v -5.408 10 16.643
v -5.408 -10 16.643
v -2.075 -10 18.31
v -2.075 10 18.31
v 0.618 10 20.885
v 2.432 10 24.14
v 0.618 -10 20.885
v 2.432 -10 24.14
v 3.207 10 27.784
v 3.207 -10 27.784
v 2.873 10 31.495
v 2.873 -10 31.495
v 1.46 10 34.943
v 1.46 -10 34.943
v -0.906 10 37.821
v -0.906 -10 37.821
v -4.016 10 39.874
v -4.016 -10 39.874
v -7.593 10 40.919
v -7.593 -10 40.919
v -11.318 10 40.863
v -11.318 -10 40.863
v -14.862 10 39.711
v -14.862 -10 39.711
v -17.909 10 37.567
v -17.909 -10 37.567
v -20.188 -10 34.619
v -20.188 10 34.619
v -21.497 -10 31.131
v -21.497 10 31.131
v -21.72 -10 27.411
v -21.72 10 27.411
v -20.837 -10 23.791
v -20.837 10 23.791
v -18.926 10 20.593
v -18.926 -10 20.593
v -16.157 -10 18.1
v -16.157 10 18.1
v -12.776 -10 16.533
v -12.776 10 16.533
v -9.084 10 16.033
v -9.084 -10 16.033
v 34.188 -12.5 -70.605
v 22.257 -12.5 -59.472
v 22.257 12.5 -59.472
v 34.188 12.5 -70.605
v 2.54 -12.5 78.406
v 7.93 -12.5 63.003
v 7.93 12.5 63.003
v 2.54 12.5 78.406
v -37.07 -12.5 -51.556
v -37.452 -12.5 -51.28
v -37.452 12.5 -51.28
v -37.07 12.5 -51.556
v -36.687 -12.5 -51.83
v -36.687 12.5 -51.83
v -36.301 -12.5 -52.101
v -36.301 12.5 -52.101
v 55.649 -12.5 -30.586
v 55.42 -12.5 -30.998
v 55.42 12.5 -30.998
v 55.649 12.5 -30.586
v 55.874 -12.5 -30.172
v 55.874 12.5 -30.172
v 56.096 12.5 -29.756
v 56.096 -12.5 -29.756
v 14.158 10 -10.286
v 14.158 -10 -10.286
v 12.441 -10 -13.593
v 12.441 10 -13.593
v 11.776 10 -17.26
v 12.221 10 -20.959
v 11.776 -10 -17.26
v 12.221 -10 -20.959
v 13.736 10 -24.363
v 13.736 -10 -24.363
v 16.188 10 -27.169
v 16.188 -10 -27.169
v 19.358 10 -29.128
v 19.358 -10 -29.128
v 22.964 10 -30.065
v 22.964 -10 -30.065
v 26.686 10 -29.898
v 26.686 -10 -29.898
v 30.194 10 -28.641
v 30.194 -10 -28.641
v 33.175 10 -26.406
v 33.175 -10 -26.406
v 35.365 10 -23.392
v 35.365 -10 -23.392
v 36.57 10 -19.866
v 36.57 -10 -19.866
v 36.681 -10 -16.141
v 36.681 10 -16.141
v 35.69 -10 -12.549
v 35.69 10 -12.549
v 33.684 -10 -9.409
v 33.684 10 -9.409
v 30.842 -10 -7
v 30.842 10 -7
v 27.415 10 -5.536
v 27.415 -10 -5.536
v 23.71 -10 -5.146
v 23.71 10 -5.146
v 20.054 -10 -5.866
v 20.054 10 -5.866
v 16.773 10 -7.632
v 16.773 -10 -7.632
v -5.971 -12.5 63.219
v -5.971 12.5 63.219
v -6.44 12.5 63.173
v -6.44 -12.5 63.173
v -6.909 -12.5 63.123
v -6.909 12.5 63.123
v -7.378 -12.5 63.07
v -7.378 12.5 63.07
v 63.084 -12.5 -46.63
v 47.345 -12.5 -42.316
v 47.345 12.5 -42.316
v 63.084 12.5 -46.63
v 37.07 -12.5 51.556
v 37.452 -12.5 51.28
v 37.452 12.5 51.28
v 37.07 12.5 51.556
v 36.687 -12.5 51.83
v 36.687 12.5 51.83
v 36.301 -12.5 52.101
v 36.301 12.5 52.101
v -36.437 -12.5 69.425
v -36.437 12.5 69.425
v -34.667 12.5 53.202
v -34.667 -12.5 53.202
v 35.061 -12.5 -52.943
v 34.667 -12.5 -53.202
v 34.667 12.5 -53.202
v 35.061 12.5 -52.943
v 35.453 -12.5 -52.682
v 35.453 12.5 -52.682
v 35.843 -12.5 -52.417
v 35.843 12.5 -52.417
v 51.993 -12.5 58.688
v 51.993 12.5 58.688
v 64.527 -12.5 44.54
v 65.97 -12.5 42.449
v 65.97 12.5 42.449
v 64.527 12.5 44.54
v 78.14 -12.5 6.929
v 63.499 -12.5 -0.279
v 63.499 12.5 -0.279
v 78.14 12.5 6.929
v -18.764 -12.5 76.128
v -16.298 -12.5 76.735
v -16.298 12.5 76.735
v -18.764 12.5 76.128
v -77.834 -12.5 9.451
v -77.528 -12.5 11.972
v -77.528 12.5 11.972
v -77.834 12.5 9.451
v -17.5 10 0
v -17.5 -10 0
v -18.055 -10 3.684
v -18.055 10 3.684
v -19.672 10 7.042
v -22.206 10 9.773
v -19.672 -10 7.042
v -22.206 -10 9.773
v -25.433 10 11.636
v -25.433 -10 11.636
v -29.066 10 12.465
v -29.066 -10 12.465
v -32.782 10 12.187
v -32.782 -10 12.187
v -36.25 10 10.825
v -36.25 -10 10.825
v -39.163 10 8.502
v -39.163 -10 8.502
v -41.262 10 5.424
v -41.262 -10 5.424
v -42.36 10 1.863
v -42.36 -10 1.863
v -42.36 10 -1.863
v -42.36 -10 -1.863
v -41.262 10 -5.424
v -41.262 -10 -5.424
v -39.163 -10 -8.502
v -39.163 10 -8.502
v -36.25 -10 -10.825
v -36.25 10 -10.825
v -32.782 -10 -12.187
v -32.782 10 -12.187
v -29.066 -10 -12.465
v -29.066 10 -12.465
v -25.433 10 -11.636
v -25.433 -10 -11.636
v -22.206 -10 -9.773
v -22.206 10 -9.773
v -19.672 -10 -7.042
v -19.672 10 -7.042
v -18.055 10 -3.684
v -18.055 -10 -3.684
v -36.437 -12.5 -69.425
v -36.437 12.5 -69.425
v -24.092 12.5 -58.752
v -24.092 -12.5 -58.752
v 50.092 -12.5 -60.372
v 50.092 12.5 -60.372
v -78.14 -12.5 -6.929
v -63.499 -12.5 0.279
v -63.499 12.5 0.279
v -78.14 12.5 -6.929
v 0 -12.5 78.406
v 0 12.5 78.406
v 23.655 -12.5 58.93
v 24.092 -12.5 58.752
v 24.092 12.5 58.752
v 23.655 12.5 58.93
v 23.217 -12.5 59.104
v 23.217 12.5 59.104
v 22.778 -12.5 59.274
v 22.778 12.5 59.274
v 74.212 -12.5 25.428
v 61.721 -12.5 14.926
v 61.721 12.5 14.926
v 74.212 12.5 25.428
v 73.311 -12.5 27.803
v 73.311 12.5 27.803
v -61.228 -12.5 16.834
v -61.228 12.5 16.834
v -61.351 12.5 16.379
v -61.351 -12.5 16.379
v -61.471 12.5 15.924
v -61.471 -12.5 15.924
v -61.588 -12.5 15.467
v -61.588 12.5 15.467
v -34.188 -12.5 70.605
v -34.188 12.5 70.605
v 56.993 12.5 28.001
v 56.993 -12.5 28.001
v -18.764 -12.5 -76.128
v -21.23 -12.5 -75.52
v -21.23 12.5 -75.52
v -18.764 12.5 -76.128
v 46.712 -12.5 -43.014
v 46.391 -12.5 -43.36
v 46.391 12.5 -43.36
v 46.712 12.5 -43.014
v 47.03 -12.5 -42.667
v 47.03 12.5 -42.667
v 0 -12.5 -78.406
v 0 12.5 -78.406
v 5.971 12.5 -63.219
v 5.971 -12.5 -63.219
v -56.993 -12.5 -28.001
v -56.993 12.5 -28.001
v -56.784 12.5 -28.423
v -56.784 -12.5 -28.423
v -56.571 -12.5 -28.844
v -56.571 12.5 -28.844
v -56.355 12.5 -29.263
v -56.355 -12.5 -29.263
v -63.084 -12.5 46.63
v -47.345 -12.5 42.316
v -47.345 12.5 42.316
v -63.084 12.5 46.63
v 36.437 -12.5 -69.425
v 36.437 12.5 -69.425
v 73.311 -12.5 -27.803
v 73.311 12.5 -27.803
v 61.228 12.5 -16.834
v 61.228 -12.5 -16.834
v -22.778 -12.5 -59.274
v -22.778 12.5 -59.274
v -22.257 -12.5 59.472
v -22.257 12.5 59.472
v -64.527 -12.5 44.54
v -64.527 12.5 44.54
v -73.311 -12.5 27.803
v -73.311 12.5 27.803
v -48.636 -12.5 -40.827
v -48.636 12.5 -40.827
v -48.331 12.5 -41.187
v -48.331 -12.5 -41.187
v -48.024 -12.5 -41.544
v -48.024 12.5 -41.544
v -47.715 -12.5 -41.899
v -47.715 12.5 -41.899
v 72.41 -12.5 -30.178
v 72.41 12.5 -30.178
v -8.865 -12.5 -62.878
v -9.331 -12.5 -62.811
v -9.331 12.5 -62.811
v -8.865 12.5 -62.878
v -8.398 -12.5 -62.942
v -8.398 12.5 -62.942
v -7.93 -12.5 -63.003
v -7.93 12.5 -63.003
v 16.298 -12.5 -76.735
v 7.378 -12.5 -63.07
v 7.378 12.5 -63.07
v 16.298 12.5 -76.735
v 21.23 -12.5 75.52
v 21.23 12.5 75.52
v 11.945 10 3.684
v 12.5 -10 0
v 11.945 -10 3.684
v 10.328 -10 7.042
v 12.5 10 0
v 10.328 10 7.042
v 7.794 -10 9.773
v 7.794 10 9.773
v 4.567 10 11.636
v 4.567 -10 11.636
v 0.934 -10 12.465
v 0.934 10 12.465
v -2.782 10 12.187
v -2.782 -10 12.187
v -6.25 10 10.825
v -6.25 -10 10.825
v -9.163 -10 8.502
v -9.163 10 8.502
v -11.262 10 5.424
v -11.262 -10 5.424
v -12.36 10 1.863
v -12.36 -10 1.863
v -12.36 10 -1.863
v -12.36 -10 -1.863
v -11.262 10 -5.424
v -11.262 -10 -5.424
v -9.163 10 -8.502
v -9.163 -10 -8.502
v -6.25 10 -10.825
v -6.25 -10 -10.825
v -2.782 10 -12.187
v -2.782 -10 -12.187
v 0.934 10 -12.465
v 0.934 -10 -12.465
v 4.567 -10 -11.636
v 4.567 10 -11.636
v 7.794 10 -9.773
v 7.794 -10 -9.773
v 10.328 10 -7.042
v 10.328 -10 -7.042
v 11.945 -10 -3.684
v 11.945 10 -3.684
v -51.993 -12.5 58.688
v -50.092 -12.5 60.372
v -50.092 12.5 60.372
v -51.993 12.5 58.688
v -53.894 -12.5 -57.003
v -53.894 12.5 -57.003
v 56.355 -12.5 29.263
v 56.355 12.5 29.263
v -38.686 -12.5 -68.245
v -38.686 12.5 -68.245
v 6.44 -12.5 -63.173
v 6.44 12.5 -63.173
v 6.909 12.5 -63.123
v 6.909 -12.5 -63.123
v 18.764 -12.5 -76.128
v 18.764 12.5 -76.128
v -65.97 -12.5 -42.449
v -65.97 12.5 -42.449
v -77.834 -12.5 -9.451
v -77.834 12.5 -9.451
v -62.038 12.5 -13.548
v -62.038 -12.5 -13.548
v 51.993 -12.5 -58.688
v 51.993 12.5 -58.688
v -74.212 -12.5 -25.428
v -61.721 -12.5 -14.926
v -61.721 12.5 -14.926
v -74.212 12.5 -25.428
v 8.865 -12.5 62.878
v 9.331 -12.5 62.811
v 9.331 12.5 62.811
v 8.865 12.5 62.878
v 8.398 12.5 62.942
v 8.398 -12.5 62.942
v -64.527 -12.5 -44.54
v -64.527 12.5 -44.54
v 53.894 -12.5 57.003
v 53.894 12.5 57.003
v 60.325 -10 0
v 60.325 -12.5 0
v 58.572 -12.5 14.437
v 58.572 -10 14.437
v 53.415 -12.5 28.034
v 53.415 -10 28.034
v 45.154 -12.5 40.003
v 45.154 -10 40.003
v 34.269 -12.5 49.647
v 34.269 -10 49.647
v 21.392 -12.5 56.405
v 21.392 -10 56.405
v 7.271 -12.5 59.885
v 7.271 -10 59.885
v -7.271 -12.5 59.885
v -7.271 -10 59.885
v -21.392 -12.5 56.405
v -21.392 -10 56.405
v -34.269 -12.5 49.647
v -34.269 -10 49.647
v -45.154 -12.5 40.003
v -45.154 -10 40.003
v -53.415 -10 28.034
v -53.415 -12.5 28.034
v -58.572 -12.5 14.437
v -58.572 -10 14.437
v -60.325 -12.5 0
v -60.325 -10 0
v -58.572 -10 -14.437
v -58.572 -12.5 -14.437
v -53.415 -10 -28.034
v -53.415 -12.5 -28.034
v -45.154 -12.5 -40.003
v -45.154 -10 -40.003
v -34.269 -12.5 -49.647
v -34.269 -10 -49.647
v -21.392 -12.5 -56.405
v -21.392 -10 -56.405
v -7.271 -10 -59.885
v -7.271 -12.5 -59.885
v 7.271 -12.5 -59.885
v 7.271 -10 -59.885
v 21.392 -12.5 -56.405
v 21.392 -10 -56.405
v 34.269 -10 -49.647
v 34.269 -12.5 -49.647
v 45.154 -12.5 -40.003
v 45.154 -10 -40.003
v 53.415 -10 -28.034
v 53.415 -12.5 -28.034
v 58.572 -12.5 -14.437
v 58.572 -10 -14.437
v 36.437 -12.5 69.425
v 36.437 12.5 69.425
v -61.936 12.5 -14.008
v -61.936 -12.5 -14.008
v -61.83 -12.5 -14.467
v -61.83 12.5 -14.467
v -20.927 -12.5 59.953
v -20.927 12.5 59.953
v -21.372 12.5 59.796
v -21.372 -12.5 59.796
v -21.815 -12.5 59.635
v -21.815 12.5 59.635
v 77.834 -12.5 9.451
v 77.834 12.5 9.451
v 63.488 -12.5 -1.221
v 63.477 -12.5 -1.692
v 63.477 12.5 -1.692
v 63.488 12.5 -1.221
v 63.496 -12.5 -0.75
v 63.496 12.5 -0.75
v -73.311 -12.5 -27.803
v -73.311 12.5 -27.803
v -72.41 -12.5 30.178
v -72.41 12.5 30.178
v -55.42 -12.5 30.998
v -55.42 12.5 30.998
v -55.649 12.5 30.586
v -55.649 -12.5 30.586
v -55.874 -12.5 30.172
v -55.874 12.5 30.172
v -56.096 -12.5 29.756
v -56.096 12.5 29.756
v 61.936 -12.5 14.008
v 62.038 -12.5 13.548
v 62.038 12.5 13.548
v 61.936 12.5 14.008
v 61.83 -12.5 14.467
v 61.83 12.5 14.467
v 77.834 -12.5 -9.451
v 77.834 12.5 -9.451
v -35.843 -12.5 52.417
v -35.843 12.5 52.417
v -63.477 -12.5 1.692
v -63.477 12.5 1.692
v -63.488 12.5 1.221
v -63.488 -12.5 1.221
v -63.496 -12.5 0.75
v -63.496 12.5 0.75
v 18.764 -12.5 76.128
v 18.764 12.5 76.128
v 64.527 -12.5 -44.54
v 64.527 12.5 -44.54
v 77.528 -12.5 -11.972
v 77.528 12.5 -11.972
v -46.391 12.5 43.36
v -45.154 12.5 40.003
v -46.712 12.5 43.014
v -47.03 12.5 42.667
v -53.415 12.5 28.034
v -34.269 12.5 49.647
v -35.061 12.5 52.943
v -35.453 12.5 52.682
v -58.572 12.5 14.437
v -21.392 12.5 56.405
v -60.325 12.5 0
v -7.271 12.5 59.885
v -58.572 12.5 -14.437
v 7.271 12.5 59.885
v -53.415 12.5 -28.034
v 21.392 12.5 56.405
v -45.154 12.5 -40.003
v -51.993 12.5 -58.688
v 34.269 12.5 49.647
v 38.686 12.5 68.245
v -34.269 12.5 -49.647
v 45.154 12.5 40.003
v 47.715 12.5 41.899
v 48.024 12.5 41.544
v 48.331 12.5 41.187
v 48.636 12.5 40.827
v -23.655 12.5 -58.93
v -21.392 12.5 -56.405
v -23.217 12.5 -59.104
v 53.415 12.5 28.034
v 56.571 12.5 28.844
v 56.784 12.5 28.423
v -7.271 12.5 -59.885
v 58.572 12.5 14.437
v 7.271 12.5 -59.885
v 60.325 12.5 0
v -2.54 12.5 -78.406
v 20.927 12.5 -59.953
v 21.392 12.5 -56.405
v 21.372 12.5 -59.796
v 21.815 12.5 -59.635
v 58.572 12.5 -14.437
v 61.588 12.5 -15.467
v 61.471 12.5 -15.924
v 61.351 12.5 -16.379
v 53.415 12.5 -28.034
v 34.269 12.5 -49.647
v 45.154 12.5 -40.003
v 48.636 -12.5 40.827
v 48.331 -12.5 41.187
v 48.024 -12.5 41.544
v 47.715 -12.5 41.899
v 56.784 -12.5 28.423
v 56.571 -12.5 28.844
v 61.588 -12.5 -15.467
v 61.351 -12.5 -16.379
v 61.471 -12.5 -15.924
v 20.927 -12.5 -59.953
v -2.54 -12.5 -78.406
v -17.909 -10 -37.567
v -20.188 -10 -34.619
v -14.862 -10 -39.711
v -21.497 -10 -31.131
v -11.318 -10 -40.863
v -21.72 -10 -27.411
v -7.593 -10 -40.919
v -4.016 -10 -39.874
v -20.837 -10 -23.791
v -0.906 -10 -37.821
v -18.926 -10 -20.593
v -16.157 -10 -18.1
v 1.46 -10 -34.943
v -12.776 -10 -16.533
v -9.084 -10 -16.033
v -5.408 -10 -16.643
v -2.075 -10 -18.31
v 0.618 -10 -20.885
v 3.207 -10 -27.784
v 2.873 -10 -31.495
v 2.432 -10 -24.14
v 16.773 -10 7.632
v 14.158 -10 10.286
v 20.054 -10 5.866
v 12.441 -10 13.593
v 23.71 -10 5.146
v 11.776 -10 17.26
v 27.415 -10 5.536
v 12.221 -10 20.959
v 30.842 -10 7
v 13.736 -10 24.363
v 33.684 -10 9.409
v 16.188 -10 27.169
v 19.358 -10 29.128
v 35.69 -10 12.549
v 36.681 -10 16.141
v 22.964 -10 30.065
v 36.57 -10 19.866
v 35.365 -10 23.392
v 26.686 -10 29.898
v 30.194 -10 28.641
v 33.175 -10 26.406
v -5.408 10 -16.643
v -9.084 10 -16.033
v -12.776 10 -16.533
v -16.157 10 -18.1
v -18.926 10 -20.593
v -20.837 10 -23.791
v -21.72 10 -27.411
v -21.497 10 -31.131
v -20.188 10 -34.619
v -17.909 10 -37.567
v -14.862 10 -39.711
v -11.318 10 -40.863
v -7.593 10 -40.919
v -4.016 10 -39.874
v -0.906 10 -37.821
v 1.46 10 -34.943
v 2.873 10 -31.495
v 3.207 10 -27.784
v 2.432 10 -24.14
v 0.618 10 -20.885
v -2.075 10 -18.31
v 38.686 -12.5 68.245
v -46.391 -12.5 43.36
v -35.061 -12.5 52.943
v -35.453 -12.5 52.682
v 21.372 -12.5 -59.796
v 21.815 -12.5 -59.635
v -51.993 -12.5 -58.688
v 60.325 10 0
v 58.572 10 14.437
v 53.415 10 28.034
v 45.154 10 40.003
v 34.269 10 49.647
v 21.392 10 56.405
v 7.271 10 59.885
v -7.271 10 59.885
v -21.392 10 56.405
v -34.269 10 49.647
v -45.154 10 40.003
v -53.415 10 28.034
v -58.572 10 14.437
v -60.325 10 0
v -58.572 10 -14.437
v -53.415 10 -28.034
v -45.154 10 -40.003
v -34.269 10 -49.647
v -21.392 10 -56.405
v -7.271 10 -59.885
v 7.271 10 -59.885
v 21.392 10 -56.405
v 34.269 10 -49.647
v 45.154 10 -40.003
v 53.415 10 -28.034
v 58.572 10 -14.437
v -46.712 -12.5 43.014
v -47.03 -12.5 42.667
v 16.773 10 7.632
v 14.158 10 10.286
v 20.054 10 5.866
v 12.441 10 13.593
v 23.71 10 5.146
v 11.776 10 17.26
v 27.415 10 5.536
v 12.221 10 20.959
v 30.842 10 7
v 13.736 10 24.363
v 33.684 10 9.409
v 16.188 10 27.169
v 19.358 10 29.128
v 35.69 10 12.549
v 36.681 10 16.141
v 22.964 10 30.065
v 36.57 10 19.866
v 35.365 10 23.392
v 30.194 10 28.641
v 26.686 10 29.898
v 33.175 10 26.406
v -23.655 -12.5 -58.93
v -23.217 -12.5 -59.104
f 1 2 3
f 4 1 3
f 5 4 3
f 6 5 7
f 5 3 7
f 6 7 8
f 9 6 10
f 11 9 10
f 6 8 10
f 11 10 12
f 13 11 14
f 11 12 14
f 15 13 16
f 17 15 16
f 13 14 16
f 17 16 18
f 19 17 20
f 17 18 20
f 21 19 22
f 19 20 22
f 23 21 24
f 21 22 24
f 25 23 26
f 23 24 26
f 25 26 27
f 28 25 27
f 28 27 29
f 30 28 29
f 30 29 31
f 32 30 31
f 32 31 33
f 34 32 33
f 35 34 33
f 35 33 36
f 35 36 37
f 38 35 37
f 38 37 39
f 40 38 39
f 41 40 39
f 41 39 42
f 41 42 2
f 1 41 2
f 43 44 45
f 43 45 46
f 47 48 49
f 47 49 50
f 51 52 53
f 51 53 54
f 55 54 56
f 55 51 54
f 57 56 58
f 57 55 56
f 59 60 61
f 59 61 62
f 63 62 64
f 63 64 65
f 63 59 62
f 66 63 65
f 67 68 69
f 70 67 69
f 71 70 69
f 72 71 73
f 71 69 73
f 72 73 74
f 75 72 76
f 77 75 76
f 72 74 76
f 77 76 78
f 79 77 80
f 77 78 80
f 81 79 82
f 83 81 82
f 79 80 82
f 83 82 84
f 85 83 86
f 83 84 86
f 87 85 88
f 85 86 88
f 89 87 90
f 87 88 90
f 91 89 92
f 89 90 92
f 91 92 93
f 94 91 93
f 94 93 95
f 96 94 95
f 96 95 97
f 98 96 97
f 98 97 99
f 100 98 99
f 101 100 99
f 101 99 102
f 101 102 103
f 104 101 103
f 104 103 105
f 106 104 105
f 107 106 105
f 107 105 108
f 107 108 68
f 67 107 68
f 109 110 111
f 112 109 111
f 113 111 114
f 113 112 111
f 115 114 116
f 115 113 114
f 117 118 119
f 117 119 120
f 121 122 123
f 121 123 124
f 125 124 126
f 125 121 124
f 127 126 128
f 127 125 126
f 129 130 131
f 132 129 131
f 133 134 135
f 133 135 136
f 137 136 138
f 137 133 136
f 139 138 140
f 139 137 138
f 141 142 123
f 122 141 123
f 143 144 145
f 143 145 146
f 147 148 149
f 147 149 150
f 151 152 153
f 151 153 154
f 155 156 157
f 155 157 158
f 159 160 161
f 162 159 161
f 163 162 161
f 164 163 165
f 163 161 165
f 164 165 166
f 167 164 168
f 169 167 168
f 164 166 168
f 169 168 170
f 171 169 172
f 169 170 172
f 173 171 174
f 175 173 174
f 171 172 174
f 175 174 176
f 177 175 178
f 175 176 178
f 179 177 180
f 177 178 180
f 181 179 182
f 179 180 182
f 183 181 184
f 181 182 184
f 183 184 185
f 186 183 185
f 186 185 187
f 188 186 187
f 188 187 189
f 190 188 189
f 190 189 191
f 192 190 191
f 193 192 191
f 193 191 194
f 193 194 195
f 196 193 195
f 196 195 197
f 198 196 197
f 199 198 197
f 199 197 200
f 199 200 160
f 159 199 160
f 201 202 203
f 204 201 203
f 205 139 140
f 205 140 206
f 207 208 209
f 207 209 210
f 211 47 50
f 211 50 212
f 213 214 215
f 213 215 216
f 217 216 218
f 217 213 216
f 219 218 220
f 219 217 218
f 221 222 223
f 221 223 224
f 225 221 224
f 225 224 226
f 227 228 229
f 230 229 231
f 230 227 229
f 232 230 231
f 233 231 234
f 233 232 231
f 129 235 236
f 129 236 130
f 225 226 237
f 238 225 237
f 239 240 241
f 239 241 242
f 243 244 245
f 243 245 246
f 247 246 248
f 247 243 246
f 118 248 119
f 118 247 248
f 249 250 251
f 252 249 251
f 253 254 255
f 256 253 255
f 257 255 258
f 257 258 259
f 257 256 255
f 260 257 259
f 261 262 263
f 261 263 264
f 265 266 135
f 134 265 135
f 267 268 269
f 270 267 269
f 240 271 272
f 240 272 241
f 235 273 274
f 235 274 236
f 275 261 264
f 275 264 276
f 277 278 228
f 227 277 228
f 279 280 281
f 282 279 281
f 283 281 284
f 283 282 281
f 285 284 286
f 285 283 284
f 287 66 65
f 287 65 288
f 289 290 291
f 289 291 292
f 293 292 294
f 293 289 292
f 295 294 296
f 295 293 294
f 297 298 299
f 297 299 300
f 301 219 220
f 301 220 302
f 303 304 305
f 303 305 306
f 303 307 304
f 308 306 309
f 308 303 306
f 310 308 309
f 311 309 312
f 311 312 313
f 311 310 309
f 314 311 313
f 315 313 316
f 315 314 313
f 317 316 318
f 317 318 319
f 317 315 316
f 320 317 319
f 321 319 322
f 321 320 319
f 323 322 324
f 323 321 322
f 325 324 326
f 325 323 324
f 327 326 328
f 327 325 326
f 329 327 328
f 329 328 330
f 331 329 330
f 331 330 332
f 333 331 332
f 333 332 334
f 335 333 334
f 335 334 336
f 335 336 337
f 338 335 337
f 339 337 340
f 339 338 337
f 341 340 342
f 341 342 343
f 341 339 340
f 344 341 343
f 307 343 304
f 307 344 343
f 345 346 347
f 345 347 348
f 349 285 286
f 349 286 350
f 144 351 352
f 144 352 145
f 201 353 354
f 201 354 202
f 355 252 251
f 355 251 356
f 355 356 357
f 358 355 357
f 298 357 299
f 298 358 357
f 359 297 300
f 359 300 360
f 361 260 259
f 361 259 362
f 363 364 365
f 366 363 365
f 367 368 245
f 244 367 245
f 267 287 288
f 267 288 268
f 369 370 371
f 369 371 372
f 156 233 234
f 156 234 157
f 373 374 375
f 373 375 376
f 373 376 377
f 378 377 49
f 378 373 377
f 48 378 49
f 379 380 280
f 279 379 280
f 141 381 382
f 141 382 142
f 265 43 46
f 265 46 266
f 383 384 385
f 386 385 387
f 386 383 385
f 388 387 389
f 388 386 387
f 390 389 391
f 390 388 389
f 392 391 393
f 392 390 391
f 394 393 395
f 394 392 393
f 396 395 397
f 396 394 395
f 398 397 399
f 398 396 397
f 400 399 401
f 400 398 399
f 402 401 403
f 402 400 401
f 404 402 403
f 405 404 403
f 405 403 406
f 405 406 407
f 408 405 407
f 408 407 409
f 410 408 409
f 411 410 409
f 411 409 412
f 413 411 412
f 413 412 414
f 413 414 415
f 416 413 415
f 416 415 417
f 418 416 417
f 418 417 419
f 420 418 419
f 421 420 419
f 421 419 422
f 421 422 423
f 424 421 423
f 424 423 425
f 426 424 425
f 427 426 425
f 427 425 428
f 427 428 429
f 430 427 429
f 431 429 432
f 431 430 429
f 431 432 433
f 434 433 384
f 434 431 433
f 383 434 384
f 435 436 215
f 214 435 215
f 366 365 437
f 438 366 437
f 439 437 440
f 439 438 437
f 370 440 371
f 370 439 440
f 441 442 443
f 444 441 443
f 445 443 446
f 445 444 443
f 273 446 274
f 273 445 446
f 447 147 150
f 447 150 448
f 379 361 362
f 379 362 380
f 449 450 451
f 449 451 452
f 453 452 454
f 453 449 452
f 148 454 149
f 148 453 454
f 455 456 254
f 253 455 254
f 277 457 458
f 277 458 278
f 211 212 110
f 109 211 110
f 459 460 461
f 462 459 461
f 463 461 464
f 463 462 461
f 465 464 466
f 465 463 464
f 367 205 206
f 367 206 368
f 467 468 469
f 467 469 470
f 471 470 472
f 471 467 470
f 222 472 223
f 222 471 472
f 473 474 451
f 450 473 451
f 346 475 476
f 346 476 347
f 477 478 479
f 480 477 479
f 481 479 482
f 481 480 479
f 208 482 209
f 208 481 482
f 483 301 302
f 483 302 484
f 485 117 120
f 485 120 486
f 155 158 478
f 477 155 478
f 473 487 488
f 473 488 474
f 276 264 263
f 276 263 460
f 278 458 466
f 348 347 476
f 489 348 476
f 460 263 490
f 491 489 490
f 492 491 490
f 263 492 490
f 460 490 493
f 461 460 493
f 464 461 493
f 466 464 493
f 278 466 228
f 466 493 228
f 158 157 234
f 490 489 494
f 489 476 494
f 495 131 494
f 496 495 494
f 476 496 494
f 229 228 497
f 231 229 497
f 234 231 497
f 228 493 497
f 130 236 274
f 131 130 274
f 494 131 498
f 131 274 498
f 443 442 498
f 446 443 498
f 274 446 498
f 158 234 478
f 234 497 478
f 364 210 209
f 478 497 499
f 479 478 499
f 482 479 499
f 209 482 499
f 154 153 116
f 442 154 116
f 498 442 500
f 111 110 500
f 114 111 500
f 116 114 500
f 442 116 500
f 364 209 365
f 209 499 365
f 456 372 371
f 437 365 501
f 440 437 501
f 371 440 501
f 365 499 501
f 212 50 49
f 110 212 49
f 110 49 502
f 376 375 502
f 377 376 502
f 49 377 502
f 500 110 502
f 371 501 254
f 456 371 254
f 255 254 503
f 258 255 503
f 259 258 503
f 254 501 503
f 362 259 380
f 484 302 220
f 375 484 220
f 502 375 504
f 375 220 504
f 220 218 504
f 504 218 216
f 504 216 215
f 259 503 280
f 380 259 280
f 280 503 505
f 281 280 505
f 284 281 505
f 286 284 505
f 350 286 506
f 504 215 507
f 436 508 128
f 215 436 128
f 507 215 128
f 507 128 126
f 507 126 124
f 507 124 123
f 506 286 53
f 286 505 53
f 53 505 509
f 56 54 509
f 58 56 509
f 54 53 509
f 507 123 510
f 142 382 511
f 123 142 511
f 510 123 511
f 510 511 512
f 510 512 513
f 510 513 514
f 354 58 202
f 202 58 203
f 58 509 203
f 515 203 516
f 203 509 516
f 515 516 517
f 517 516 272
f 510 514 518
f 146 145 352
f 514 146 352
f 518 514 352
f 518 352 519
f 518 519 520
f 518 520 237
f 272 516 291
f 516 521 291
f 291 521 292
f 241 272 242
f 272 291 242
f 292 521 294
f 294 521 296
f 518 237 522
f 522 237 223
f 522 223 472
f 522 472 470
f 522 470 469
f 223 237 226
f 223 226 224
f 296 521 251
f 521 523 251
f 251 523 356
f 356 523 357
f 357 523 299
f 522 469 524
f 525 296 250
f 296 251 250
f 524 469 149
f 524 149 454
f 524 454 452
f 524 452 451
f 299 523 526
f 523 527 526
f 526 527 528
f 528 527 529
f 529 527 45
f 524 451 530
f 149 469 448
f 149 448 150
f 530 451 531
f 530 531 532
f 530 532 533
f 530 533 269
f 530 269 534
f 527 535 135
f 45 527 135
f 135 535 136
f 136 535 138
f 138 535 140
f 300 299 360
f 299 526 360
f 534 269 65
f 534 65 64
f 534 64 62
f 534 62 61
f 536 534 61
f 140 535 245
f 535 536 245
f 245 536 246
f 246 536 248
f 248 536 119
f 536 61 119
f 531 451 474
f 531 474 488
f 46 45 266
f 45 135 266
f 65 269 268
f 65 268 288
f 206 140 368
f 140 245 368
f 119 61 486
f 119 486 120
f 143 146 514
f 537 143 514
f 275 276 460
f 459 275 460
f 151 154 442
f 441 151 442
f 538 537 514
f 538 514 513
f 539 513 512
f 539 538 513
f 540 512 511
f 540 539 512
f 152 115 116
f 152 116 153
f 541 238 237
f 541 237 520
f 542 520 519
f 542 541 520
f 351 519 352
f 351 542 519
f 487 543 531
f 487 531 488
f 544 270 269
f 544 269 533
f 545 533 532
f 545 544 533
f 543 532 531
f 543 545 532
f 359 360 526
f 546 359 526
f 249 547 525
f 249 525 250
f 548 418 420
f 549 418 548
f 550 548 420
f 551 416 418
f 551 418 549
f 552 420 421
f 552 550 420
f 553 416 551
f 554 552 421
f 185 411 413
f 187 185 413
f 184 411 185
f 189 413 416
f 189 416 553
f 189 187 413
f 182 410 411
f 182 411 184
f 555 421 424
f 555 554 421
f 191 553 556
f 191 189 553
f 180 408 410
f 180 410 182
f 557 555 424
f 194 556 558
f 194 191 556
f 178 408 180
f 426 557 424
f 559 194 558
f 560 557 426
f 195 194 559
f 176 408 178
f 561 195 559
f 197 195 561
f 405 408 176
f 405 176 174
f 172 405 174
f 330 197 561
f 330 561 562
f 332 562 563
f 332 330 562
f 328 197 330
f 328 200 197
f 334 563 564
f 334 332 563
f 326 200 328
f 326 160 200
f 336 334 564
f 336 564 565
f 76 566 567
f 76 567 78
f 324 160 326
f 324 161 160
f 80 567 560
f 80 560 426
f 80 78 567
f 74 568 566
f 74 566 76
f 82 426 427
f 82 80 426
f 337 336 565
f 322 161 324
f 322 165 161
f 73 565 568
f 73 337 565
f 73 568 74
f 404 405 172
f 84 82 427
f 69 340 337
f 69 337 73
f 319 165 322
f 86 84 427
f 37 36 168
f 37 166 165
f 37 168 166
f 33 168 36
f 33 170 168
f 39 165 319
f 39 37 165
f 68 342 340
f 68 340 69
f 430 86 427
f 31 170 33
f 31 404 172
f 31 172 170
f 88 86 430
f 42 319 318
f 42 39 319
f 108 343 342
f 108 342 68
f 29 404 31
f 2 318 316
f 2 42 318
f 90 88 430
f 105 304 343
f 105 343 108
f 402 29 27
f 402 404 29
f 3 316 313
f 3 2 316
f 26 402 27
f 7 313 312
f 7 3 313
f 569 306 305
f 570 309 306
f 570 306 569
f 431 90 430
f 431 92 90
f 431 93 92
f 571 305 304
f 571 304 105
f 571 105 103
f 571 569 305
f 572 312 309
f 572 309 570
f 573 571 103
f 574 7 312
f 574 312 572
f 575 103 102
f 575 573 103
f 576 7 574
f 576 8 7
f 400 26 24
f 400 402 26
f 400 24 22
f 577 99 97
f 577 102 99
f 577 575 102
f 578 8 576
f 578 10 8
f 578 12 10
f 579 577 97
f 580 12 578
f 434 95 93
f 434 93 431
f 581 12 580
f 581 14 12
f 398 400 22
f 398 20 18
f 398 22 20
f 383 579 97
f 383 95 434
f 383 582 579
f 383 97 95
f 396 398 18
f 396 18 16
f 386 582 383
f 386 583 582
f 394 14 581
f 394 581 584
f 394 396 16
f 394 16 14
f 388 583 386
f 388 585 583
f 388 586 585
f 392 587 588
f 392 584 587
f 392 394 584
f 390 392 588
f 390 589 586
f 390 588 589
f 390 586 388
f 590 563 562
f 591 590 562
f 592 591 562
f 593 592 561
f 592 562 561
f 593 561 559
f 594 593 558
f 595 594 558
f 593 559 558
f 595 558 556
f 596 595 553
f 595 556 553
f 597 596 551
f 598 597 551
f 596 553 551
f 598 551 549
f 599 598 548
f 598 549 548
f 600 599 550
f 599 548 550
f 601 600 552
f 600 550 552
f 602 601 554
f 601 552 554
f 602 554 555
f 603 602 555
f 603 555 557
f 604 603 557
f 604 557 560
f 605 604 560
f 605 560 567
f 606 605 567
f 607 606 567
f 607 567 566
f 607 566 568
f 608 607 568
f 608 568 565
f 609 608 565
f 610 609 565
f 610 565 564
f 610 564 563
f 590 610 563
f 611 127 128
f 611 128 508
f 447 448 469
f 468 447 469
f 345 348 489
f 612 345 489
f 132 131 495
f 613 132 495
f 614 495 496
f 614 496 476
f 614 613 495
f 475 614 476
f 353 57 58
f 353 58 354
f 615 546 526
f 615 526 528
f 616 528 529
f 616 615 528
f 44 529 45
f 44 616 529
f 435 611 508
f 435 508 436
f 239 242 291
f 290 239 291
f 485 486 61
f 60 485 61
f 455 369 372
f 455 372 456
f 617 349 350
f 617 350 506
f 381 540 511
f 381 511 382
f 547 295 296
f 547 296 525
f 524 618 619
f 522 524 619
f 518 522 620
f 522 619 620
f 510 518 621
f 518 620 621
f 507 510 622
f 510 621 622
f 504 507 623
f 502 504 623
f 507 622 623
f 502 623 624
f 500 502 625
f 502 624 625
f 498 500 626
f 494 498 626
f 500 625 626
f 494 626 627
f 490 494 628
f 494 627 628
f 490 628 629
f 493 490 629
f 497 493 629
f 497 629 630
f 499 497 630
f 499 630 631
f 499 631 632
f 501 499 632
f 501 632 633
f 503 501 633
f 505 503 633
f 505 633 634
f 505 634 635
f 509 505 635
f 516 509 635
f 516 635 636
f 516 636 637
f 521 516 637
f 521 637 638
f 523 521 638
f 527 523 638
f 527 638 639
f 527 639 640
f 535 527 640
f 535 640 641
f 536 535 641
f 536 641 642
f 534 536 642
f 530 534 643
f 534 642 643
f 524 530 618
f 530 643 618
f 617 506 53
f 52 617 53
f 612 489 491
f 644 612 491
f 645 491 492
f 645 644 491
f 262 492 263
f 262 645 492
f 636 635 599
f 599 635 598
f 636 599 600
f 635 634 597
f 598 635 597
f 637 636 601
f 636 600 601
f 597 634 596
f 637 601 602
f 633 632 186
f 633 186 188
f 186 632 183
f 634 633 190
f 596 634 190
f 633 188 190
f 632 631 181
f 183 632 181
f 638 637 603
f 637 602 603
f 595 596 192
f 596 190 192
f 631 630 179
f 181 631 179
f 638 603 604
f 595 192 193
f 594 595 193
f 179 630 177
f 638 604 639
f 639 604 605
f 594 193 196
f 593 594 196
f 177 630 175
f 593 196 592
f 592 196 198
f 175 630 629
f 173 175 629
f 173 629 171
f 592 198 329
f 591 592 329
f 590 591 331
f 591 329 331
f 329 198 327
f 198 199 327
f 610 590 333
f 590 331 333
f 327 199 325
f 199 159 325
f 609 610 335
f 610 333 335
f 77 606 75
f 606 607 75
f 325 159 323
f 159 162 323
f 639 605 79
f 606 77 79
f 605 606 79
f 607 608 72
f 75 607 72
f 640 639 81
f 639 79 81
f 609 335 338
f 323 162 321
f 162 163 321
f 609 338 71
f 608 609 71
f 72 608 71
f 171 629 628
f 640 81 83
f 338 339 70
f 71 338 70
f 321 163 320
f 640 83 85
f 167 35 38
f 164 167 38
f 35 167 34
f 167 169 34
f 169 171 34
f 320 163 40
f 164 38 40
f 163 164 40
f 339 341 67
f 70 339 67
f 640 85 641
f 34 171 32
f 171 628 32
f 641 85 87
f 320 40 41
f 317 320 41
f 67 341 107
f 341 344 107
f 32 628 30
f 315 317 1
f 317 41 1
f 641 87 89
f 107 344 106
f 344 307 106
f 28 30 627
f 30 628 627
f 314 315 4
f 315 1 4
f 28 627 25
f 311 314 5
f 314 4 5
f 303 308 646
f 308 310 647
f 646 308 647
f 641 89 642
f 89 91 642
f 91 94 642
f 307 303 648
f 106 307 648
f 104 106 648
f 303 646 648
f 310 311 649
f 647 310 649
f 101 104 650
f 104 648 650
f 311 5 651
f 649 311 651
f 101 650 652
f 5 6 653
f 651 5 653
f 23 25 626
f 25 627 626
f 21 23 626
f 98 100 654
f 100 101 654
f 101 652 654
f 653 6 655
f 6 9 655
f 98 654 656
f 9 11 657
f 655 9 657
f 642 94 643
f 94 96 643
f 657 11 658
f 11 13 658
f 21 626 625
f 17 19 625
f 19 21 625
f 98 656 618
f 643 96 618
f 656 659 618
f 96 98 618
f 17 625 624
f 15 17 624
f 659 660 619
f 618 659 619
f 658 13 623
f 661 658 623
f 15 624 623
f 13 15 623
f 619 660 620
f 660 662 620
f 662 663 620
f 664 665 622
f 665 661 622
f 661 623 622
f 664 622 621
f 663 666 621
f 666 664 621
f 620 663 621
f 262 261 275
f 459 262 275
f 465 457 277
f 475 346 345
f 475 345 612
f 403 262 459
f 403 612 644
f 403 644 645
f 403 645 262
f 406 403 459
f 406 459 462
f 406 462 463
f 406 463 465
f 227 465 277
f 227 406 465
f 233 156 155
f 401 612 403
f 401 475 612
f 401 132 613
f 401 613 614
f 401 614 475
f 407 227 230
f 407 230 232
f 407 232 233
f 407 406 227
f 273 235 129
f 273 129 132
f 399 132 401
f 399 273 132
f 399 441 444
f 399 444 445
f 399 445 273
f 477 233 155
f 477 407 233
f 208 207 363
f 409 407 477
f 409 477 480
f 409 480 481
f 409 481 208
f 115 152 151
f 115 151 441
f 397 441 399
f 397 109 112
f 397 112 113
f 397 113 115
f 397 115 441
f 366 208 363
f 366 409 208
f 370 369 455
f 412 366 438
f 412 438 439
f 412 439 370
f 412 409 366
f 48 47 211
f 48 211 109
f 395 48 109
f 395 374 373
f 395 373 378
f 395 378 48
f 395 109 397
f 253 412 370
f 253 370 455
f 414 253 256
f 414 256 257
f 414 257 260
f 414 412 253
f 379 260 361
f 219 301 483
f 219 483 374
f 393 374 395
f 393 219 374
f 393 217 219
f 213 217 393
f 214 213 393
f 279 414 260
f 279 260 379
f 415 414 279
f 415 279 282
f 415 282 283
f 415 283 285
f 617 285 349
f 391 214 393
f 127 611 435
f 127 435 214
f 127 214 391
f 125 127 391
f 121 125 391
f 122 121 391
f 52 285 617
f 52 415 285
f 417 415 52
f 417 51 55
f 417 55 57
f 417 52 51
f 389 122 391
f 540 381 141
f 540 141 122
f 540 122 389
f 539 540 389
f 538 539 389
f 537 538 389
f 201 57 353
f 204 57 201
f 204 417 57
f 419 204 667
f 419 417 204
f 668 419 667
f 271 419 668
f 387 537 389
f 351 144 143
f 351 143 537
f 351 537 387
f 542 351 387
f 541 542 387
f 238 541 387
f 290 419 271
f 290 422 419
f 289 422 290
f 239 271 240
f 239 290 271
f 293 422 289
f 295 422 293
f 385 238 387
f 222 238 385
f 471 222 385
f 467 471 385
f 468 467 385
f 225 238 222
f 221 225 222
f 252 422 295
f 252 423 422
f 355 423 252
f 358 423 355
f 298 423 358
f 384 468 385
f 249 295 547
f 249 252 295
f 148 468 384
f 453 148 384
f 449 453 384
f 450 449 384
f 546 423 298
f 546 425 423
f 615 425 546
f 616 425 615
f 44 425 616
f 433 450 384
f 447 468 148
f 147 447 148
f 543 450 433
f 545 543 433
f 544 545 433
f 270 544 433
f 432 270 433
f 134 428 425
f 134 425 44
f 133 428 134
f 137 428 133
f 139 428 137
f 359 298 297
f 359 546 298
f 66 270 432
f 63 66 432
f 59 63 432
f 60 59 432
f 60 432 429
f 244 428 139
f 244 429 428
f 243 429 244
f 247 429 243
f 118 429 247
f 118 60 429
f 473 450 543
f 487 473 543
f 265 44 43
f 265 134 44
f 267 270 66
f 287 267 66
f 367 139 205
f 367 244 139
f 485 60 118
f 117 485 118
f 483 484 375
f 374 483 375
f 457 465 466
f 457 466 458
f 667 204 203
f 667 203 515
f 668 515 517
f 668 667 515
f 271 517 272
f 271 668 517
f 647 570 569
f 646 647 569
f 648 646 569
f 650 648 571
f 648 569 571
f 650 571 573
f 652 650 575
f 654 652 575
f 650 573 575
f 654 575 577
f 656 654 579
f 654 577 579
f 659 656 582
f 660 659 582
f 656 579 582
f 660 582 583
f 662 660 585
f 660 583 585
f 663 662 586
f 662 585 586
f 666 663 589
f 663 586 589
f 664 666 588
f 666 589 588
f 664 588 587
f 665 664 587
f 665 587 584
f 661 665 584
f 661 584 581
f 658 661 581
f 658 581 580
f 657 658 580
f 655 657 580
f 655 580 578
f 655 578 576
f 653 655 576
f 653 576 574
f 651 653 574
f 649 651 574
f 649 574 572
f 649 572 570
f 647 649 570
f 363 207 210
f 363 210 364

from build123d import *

# Parameters (mm, degrees)
F0_R            = 60.325
F0_R_2          = 12.5
F1_DEPTH        = 10
F2_DEPTH        = 12.5
F3_DEPTH        = 12.5
F3_COPIES_COUNT = 26
F4_R            = 12.5
F5_DEPTH        = 22.501
F5_COPIES_COUNT = 5


# Not quite as in the source:
# - a pattern or mirror of a feature is missing from the dataset's text; its kind, count and spacing are read off the source's solid


with BuildPart() as f1:
    # F0 (on Front) → F1 (new body, symmetric)
    with BuildSketch(Plane.XZ):
        with BuildLine():
            ThreePointArc((-5.9714194874, 63.2186060373), (-42.7379507145, -46.9650675367), (63.5, 0))
            ThreePointArc((63.5, 0), (47.6226622583, 42.0039526644), (7.9304869469, 63.0028362598))
            ThreePointArc((7.9304869469, 63.0028362598), (0.9854569889, 63.4923528822), (-5.9714194874, 63.2186060373))
        make_face()
        Circle(F0_R, mode=Mode.SUBTRACT)
        Circle(F0_R)
        Circle(F0_R_2, mode=Mode.SUBTRACT)
    extrude(amount=F1_DEPTH, both=True)

    # F0 (on Front) → F2 (join, symmetric)
    with BuildSketch(Plane.XZ):
        with BuildLine():
            ThreePointArc((-5.9714194874, 63.2186060373), (-42.7379507145, -46.9650675367), (63.5, 0))
            ThreePointArc((63.5, 0), (47.6226622583, 42.0039526644), (7.9304869469, 63.0028362598))
            ThreePointArc((7.9304869469, 63.0028362598), (0.9854569889, 63.4923528822), (-5.9714194874, 63.2186060373))
        make_face()
        Circle(F0_R, mode=Mode.SUBTRACT)
    extrude(amount=F2_DEPTH, both=True)

    # F0 (on Front) → F3 (join, symmetric)
    with BuildSketch(Plane.XZ):
        with BuildLine():
            ThreePointArc((-5.9714194874, 63.2186060373), (0.9854569889, 63.4923528822), (7.9304869469, 63.0028362598))
            Line((7.9304869469, 63.0028362598), (2.54, 78.4059613943))
            Line((2.54, 78.4059613943), (0, 78.4059613943))
            Line((0, 78.4059613943), (-5.9714194874, 63.2186060373))
        make_face()
    f3 = extrude(amount=F3_DEPTH, both=True)

    # F3_copies: F3 ×26 about axis
    f3_copies_axis = Axis((0, 0, 0), (0, 1, 0))
    for i in range(1, F3_COPIES_COUNT):
        add(f3.rotate(f3_copies_axis, i * 360 / F3_COPIES_COUNT))

    # F4 (on face) → F5 (cut, through all)
    with BuildSketch(Plane.XZ.offset(10)):
        with Locations((-30, 0)):
            Circle(F4_R)
    f5 = extrude(amount=-F5_DEPTH, mode=Mode.SUBTRACT)

    # F5_copies: F5 ×5 about axis
    f5_copies_axis = Axis((0, 0, 0), (0, 1, 0))
    for i in range(1, F5_COPIES_COUNT):
        add(f5.rotate(f5_copies_axis, i * 360 / F5_COPIES_COUNT), mode=Mode.SUBTRACT)


solid = f1.part
